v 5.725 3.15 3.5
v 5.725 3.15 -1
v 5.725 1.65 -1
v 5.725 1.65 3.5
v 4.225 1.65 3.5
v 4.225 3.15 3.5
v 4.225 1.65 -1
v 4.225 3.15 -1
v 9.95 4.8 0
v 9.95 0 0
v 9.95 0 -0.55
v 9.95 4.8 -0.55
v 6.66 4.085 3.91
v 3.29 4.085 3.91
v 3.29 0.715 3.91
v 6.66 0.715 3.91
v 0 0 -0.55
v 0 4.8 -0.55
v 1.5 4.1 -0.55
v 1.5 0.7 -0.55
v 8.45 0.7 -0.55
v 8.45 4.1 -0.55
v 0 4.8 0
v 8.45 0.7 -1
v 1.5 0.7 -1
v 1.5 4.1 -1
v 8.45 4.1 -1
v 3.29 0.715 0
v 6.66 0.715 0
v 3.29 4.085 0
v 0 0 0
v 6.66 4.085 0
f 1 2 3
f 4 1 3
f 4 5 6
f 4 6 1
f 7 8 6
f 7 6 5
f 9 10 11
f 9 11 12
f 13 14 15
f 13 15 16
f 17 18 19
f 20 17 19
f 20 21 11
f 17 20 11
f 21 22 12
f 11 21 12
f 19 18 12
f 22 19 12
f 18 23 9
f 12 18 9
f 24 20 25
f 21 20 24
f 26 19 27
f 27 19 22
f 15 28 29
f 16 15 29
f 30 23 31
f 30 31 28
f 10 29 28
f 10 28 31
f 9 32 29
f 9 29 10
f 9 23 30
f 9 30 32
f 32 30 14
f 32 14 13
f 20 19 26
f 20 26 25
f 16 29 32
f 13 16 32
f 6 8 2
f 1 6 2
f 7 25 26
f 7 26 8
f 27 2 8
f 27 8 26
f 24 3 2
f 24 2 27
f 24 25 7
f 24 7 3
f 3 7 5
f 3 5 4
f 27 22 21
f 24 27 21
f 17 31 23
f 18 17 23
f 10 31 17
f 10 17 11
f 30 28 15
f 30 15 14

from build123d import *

# Parameters (mm, degrees)
F0_W     = 9.95
F0_H     = 4.8
F1_DEPTH = 0.55
F2_W     = 6.95
F2_H     = 3.4
F3_DEPTH = 0.45
F4_W     = 3.37
F4_H     = 3.37
F5_DEPTH = 3.91
F6_W     = 1.5
F6_H     = 1.5
F7_DEPTH = 4.5


with BuildPart() as f1:
    # F0 (on Top) → F1 (new body)
    with BuildSketch(Plane.XY):
        with Locations((4.975, 2.4)):
            Rectangle(F0_W, F0_H)
    extrude(amount=-F1_DEPTH)

    # F2 (on face) → F3 (join)
    with BuildSketch(Plane(origin=(0, 0, -0.55), x_dir=(1, 0, 0), z_dir=(0, 0, -1))):
        with Locations((4.975, -2.4)):
            Rectangle(F2_W, F2_H)
    extrude(amount=F3_DEPTH)

    # F4 (on face) → F5 (join)
    with BuildSketch(Plane.XY):
        with Locations((4.975, 2.4)):
            Rectangle(F4_W, F4_H)
    extrude(amount=F5_DEPTH)

    # F6 (on face) → F7 (cut)
    with BuildSketch(Plane(origin=(0, 0, -1), x_dir=(1, 0, 0), z_dir=(0, 0, -1))):
        with Locations((4.975, -2.4)):
            Rectangle(F6_W, F6_H)
    extrude(amount=-F7_DEPTH, mode=Mode.SUBTRACT)


solid = f1.part
